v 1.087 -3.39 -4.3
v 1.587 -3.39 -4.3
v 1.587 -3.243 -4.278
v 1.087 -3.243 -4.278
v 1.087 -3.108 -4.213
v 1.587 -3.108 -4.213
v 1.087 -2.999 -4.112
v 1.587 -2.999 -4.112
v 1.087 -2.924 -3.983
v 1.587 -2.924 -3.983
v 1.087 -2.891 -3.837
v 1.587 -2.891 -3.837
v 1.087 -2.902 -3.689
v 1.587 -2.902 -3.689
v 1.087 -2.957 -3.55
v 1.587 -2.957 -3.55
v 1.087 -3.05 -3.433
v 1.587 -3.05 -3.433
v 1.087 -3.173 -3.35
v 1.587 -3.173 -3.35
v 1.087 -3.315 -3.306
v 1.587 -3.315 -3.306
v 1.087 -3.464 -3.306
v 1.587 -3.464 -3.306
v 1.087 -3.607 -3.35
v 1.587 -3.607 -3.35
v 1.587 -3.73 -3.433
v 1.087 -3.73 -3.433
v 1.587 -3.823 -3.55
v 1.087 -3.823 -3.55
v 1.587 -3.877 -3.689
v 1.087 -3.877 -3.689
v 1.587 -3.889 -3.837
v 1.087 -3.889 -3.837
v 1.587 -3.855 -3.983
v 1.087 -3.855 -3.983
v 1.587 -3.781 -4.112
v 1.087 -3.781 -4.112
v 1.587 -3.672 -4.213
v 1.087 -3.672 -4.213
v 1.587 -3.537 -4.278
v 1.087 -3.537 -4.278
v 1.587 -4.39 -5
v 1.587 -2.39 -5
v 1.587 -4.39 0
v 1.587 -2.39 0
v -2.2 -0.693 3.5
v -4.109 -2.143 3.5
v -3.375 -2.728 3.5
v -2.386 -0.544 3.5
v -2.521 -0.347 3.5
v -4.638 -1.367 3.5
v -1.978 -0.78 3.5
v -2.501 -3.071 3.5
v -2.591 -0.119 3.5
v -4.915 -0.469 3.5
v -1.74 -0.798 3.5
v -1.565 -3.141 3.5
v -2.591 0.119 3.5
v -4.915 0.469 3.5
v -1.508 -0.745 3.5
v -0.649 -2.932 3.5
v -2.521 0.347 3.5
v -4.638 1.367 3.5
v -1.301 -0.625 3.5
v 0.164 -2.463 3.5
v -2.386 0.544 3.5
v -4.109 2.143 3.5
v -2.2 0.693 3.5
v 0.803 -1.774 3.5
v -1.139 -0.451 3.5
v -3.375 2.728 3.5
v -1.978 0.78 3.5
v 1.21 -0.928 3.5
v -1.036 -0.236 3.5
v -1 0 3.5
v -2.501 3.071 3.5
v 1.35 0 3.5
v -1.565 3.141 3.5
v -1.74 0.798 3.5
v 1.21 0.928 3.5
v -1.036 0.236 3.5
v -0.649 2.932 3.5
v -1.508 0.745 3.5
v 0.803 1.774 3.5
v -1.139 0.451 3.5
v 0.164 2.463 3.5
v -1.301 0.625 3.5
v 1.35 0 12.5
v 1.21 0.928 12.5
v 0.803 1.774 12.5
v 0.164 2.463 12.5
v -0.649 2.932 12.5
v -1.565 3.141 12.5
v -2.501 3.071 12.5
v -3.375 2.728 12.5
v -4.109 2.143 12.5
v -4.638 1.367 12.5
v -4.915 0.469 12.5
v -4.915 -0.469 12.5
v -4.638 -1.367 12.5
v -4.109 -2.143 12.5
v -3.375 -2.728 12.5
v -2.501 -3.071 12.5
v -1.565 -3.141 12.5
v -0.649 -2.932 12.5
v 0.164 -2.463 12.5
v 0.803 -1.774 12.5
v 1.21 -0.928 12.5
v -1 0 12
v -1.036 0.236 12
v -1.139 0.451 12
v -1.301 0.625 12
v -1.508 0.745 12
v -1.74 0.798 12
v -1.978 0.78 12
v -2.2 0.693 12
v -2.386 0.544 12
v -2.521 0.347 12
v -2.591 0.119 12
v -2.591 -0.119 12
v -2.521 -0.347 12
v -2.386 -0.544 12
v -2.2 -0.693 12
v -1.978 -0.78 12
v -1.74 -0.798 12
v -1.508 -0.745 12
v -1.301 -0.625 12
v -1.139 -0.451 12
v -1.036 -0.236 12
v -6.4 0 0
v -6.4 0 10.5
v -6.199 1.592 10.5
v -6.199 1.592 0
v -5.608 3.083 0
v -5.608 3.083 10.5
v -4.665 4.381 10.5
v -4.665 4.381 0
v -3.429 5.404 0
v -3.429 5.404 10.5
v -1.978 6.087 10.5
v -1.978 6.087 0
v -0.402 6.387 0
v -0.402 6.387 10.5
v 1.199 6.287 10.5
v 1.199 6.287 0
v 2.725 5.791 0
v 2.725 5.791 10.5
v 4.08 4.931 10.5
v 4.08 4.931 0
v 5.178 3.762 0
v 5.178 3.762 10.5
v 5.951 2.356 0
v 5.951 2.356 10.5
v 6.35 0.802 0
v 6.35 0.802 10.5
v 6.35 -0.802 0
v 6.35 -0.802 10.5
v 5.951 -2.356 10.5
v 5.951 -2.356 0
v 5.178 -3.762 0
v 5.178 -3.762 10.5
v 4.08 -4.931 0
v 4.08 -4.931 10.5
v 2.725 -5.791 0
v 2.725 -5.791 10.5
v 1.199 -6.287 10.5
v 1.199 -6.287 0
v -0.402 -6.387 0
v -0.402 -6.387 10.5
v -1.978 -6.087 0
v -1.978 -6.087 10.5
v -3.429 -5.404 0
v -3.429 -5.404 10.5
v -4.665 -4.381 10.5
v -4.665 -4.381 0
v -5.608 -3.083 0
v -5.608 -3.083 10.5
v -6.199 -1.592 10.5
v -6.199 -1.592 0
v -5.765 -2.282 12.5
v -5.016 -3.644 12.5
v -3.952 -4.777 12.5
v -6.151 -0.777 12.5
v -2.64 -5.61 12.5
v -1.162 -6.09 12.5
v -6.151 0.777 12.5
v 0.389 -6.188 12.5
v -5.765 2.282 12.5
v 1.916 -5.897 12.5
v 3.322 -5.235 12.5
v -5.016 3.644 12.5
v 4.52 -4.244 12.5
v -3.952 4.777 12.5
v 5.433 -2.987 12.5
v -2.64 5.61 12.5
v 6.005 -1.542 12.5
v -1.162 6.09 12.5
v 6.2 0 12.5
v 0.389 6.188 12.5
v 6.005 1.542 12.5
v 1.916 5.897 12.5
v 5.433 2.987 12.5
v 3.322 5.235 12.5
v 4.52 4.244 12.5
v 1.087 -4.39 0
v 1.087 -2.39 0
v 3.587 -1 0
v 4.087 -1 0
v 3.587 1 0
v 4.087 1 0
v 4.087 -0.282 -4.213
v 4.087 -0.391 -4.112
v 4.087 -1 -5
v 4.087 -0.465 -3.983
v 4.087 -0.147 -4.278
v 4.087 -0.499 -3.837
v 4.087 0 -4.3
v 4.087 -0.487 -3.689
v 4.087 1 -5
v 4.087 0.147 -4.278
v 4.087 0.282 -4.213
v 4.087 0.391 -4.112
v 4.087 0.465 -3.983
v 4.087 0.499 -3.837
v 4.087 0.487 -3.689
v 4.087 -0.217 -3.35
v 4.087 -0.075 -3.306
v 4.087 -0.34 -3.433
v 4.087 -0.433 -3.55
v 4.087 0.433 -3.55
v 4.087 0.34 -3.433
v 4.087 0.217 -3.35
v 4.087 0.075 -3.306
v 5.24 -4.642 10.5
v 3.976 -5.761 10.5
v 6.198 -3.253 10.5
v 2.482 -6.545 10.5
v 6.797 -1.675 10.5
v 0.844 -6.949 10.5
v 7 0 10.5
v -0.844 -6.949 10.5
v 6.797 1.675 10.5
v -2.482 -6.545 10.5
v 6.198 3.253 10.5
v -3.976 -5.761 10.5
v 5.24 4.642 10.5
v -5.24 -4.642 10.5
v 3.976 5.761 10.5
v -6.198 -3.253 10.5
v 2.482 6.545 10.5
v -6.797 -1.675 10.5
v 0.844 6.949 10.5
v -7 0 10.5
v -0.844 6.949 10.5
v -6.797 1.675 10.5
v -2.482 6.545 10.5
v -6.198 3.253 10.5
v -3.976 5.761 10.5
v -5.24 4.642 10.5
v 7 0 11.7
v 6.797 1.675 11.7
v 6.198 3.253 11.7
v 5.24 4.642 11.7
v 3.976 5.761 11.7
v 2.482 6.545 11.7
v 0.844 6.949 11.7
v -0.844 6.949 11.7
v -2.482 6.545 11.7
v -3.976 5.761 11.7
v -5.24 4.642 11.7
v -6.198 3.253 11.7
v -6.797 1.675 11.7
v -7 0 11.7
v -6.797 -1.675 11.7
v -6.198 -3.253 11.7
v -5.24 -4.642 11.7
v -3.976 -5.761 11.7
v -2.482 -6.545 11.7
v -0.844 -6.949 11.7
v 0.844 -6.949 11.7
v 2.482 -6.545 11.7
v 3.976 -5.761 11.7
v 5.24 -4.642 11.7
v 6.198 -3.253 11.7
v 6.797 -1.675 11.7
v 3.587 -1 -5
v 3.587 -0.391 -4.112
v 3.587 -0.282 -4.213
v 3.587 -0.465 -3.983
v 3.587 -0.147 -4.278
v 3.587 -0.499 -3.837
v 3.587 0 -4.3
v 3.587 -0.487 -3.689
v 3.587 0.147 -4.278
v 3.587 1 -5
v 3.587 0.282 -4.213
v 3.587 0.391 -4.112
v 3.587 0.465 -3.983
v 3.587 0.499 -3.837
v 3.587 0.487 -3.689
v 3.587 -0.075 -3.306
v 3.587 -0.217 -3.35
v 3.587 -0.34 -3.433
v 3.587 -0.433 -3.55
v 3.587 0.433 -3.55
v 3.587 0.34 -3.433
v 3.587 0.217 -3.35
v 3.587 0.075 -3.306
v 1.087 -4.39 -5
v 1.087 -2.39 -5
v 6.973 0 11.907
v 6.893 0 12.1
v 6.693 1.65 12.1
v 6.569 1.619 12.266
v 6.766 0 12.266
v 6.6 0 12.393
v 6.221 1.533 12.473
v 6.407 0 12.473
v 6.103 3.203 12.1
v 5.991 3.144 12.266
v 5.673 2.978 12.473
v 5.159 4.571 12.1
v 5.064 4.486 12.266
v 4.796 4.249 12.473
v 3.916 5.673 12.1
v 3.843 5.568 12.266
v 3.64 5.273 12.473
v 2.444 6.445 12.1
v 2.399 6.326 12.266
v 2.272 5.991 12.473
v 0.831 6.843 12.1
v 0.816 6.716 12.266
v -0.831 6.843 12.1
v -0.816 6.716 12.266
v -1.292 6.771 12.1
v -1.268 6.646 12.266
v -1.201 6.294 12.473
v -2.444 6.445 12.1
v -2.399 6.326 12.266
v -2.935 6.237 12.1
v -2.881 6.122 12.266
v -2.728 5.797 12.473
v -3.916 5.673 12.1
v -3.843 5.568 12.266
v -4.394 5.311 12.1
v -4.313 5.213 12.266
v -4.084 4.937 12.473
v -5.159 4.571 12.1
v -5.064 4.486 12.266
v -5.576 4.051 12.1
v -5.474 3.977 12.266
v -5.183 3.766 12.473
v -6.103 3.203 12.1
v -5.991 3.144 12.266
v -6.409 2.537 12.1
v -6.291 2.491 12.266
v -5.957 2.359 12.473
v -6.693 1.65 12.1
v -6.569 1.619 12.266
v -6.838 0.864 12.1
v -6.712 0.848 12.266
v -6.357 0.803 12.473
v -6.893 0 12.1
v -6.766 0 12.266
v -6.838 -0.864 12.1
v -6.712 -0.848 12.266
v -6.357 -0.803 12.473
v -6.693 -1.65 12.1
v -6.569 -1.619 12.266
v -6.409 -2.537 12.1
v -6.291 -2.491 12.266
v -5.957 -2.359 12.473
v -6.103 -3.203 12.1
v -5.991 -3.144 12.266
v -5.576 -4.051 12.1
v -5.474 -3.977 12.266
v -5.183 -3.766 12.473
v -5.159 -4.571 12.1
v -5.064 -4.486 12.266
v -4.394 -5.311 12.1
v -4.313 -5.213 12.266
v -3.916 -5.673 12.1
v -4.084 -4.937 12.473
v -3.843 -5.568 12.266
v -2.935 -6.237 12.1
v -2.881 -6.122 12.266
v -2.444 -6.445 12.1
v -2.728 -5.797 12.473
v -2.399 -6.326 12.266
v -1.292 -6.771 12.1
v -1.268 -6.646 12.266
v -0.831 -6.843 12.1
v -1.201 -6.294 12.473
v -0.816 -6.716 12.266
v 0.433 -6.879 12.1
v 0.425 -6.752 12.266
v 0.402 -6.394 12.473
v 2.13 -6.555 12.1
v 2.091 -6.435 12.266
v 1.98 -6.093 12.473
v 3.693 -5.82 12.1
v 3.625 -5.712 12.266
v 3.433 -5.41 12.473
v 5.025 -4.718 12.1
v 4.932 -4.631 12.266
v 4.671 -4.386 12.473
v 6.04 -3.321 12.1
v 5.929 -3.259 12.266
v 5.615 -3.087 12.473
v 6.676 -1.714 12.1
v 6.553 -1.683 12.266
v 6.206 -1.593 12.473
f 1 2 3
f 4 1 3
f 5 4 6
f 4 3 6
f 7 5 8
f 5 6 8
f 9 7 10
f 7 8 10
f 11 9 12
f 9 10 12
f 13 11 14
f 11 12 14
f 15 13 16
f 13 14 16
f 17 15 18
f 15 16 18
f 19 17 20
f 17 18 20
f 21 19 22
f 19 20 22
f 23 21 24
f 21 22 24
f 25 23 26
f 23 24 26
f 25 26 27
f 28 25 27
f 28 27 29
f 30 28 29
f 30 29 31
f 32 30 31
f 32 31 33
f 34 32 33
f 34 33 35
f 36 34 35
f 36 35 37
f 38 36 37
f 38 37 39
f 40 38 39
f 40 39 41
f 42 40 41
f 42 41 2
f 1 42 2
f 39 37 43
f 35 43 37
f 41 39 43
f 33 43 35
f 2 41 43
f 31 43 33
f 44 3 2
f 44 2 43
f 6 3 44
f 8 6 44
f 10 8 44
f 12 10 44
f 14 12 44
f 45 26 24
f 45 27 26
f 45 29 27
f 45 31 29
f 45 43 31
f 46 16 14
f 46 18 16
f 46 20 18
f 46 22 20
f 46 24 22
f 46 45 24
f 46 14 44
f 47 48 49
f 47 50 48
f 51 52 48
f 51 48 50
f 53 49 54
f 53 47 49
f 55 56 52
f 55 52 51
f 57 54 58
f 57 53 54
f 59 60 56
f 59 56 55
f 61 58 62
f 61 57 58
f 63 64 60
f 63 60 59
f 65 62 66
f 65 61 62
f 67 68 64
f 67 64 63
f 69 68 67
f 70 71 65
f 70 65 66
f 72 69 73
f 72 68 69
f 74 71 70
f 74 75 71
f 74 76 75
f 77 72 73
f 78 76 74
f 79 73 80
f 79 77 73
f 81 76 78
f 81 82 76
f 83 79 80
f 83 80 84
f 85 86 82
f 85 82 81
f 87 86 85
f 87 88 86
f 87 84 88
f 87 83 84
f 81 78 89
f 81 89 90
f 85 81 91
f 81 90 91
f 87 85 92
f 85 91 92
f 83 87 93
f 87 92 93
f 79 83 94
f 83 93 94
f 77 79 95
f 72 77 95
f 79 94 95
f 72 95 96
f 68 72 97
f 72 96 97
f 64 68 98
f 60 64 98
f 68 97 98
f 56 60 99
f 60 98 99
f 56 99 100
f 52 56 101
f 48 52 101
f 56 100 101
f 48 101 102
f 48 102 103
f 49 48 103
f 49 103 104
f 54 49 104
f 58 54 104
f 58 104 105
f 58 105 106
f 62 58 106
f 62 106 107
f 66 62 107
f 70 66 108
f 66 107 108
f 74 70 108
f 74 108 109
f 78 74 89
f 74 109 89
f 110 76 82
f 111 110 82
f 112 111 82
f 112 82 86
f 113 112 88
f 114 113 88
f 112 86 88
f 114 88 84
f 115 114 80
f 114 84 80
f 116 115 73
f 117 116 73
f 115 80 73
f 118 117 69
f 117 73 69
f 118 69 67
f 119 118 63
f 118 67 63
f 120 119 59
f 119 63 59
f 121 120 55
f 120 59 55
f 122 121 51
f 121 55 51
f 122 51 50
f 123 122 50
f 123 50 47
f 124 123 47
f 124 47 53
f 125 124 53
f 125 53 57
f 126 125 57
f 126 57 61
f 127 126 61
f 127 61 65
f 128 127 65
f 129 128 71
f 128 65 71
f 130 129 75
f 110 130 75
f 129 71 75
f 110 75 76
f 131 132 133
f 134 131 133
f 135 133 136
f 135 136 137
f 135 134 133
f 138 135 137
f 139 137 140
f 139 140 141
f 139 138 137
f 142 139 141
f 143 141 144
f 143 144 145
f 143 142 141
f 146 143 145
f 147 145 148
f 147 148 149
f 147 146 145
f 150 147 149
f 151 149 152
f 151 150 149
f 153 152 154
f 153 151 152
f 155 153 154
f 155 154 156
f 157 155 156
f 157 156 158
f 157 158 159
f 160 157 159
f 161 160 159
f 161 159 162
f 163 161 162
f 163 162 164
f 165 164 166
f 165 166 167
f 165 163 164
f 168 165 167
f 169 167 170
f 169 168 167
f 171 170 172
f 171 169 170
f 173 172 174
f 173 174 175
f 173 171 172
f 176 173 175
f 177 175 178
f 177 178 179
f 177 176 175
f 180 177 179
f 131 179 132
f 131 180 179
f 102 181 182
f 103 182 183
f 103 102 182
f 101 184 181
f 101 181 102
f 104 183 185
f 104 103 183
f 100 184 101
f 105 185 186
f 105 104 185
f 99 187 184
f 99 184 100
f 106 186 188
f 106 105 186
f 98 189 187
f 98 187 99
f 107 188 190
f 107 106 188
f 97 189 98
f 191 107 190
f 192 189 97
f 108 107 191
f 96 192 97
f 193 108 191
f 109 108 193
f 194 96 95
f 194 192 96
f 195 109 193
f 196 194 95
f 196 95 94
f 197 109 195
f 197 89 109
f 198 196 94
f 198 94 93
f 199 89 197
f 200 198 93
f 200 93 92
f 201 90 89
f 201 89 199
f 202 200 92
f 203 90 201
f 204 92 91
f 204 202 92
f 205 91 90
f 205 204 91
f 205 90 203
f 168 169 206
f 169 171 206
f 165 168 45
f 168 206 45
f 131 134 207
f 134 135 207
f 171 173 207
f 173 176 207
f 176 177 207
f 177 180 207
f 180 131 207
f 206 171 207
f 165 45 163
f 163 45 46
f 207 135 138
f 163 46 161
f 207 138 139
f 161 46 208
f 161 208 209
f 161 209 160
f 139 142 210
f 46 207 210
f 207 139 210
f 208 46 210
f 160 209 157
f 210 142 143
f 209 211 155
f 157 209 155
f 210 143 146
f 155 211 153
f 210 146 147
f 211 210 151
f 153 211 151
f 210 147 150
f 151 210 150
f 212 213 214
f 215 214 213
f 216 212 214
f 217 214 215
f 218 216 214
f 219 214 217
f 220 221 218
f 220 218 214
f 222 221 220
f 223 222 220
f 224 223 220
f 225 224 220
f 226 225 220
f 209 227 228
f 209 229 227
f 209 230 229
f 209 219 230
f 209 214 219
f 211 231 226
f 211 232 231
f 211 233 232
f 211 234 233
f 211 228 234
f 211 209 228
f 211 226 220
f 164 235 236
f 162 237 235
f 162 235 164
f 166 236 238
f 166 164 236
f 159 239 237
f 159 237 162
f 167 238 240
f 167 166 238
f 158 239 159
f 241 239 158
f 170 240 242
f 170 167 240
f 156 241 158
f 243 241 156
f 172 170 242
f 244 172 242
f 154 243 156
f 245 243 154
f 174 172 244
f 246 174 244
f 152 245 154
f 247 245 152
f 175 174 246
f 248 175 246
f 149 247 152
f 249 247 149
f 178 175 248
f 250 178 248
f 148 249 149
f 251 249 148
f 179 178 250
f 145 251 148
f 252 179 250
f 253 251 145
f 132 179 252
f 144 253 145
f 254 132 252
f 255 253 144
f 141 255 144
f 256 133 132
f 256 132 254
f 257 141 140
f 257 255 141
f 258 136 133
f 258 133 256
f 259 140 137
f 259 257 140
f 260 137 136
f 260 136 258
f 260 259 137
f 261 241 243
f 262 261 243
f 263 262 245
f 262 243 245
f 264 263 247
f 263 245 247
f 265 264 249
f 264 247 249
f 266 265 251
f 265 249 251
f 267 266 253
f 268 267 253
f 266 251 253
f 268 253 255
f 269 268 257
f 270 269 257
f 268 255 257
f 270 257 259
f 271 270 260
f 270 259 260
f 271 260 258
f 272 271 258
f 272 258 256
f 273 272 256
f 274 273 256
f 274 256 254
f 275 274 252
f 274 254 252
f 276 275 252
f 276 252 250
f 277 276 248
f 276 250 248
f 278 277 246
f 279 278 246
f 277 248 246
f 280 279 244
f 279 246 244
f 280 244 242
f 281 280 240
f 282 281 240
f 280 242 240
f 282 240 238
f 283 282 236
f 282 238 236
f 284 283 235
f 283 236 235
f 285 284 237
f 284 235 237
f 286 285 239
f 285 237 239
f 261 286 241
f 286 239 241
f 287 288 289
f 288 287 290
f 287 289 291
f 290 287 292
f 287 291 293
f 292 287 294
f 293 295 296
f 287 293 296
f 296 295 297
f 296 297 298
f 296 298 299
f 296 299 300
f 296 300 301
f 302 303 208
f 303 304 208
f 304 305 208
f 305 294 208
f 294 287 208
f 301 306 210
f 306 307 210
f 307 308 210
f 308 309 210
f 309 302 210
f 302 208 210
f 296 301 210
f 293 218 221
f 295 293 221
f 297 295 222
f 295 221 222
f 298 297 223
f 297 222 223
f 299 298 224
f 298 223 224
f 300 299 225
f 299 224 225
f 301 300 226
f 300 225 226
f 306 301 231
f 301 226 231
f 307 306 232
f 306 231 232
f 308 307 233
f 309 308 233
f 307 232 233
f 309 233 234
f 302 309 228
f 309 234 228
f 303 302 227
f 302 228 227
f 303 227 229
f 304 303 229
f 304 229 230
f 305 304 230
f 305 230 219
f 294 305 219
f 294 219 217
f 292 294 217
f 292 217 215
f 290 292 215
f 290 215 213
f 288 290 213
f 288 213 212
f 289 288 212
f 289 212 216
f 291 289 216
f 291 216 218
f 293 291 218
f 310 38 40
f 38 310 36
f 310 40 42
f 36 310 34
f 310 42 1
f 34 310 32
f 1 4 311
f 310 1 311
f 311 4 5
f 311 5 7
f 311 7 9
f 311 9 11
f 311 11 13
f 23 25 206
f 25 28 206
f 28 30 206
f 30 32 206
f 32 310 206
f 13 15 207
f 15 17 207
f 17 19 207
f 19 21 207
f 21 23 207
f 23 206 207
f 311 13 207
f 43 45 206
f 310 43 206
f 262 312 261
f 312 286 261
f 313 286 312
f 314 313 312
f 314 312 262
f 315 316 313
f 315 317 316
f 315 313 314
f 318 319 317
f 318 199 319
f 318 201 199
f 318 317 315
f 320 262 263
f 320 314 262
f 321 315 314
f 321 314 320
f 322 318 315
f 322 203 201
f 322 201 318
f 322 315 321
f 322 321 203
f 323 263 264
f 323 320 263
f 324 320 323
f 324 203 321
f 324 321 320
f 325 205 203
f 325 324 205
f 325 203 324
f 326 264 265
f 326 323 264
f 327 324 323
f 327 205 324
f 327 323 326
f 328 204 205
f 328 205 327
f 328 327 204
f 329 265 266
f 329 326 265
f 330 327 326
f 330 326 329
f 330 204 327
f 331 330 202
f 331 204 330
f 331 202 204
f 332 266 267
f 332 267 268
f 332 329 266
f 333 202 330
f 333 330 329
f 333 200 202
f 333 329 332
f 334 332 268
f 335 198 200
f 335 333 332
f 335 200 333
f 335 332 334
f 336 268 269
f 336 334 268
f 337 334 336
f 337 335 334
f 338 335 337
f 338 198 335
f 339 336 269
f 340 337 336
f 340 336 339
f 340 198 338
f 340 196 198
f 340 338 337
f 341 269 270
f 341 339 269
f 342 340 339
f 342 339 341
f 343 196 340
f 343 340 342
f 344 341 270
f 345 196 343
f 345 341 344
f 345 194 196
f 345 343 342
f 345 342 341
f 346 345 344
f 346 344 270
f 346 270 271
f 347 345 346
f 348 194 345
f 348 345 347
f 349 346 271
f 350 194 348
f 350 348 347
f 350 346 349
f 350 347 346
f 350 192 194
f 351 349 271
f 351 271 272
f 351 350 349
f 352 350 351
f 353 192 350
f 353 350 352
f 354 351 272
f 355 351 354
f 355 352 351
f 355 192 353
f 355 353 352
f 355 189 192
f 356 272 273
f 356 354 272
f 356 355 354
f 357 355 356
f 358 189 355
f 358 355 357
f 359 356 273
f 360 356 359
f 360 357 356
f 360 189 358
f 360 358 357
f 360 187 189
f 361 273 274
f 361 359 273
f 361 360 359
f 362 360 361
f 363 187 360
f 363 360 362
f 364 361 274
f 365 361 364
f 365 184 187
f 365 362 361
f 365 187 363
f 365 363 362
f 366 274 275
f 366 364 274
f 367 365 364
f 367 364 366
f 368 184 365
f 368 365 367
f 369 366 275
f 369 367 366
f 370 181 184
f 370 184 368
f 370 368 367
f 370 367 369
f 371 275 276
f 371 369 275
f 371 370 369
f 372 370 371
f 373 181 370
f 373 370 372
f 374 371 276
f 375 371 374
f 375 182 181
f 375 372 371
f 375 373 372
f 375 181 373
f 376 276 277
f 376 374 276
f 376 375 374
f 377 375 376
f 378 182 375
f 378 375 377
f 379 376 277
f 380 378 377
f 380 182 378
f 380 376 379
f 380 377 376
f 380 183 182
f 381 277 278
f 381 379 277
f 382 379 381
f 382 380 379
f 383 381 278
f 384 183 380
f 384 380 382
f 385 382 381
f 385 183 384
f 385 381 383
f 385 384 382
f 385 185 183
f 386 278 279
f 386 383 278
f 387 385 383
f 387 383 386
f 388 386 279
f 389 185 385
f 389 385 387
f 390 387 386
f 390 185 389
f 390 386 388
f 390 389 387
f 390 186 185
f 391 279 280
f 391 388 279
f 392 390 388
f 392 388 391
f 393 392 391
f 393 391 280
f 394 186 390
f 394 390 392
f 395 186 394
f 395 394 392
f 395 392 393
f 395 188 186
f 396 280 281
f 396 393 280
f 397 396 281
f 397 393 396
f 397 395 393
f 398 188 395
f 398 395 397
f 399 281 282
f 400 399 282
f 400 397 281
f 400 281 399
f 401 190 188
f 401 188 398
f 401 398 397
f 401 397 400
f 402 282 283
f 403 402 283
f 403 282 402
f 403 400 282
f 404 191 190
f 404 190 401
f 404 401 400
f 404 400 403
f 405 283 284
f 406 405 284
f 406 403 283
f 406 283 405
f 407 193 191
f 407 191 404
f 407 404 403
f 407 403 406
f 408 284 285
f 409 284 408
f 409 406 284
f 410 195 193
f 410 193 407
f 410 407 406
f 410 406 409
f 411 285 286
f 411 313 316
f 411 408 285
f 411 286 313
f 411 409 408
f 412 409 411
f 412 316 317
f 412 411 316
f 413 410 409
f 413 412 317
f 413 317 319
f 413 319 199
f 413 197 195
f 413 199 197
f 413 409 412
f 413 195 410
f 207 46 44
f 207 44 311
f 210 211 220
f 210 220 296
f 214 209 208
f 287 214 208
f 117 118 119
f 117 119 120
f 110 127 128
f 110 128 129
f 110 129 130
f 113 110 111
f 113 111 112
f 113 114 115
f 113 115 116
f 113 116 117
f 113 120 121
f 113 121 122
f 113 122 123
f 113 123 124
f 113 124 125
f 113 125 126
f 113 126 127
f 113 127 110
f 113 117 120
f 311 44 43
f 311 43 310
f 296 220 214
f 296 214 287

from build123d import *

# Parameters (mm, degrees)
ESQUISSE1_R             = 7
BOSS_EXTRU_1_DEPTH      = 12.5
ESQUISSE2_R             = 7
ESQUISSE2_R_2           = 6.4
ENL_V_MAT_EXTRU_1_DEPTH = 10.5
ESQUISSE4_R             = 3.15
ENL_V_MAT_EXTRU_3_DEPTH = 9
ESQUISSE5_R             = 0.8
BOSS_EXTRU_2_DEPTH      = 8.5
ESQUISSE6_W             = 0.5
ESQUISSE6_H             = 2
BOSS_EXTRU_3_DEPTH      = 5
ESQUISSE7_R             = 0.5
ENL_V_MAT_EXTRU_4_DEPTH = 9.587227572
ESQUISSE8_R             = 0.5
ENL_V_MAT_EXTRU_5_DEPTH = 12.087439586
CONG_7_R                = 0.8


with BuildPart() as part:
    # Esquisse1 → Boss.-Extru.1 (new body)
    with BuildSketch(Plane.XY):
        Circle(ESQUISSE1_R)
    extrude(amount=BOSS_EXTRU_1_DEPTH)

    # Esquisse2 → Enlèv. mat.-Extru.1 (cut)
    with BuildSketch(Plane(origin=(0, 0, 0), x_dir=(-1, 0, 0), z_dir=(0, 0, -1))):
        Circle(ESQUISSE2_R)
        Circle(ESQUISSE2_R_2, mode=Mode.SUBTRACT)
    extrude(amount=-ENL_V_MAT_EXTRU_1_DEPTH, mode=Mode.SUBTRACT)

    # Esquisse4 → Enlèv. mat.-Extru.3 (cut)
    with BuildSketch(Plane.XY.offset(12.5)):
        with Locations((-1.8, 0)):
            Circle(ESQUISSE4_R)
    extrude(amount=-ENL_V_MAT_EXTRU_3_DEPTH, mode=Mode.SUBTRACT)

    # Esquisse5 → Boss.-Extru.2 (add)
    with BuildSketch(Plane.XY.offset(3.5)):
        with Locations((-1.8, 0)):
            Circle(ESQUISSE5_R)
    extrude(amount=BOSS_EXTRU_2_DEPTH)

    # Esquisse6 → Boss.-Extru.3 (add)
    with BuildSketch(Plane(origin=(0, 0, 0), x_dir=(-1, 0, 0), z_dir=(0, 0, -1))):
        with Locations((-3.837439586, 0)):
            Rectangle(ESQUISSE6_W, ESQUISSE6_H)
        with Locations((-1.337227572, -3.389935619)):
            Rectangle(ESQUISSE6_W, ESQUISSE6_H)
    extrude(amount=BOSS_EXTRU_3_DEPTH)

    # Esquisse7 → Enlèv. mat.-Extru.4 (cut, through all)
    with BuildSketch(Plane(origin=(1.587227572, 0, 0), x_dir=(0, 0, -1), z_dir=(1, 0, 0))):
        with Locations((3.8, -3.389935619)):
            Circle(ESQUISSE7_R)
    extrude(amount=-ENL_V_MAT_EXTRU_4_DEPTH, mode=Mode.SUBTRACT)

    # Esquisse8 → Enlèv. mat.-Extru.5 (cut, through all)
    with BuildSketch(Plane(origin=(4.087439586, 0, 0), x_dir=(0, 0, -1), z_dir=(1, 0, 0))):
        with Locations((3.8, 0)):
            Circle(ESQUISSE8_R)
    extrude(amount=-ENL_V_MAT_EXTRU_5_DEPTH, mode=Mode.SUBTRACT)

    # Congé7
    cong_7_edges = [part.edges().sort_by_distance(p)[0] for p in [
        (-7, 0, 12.5),
    ]]
    fillet(cong_7_edges, radius=CONG_7_R)


solid = part.part
